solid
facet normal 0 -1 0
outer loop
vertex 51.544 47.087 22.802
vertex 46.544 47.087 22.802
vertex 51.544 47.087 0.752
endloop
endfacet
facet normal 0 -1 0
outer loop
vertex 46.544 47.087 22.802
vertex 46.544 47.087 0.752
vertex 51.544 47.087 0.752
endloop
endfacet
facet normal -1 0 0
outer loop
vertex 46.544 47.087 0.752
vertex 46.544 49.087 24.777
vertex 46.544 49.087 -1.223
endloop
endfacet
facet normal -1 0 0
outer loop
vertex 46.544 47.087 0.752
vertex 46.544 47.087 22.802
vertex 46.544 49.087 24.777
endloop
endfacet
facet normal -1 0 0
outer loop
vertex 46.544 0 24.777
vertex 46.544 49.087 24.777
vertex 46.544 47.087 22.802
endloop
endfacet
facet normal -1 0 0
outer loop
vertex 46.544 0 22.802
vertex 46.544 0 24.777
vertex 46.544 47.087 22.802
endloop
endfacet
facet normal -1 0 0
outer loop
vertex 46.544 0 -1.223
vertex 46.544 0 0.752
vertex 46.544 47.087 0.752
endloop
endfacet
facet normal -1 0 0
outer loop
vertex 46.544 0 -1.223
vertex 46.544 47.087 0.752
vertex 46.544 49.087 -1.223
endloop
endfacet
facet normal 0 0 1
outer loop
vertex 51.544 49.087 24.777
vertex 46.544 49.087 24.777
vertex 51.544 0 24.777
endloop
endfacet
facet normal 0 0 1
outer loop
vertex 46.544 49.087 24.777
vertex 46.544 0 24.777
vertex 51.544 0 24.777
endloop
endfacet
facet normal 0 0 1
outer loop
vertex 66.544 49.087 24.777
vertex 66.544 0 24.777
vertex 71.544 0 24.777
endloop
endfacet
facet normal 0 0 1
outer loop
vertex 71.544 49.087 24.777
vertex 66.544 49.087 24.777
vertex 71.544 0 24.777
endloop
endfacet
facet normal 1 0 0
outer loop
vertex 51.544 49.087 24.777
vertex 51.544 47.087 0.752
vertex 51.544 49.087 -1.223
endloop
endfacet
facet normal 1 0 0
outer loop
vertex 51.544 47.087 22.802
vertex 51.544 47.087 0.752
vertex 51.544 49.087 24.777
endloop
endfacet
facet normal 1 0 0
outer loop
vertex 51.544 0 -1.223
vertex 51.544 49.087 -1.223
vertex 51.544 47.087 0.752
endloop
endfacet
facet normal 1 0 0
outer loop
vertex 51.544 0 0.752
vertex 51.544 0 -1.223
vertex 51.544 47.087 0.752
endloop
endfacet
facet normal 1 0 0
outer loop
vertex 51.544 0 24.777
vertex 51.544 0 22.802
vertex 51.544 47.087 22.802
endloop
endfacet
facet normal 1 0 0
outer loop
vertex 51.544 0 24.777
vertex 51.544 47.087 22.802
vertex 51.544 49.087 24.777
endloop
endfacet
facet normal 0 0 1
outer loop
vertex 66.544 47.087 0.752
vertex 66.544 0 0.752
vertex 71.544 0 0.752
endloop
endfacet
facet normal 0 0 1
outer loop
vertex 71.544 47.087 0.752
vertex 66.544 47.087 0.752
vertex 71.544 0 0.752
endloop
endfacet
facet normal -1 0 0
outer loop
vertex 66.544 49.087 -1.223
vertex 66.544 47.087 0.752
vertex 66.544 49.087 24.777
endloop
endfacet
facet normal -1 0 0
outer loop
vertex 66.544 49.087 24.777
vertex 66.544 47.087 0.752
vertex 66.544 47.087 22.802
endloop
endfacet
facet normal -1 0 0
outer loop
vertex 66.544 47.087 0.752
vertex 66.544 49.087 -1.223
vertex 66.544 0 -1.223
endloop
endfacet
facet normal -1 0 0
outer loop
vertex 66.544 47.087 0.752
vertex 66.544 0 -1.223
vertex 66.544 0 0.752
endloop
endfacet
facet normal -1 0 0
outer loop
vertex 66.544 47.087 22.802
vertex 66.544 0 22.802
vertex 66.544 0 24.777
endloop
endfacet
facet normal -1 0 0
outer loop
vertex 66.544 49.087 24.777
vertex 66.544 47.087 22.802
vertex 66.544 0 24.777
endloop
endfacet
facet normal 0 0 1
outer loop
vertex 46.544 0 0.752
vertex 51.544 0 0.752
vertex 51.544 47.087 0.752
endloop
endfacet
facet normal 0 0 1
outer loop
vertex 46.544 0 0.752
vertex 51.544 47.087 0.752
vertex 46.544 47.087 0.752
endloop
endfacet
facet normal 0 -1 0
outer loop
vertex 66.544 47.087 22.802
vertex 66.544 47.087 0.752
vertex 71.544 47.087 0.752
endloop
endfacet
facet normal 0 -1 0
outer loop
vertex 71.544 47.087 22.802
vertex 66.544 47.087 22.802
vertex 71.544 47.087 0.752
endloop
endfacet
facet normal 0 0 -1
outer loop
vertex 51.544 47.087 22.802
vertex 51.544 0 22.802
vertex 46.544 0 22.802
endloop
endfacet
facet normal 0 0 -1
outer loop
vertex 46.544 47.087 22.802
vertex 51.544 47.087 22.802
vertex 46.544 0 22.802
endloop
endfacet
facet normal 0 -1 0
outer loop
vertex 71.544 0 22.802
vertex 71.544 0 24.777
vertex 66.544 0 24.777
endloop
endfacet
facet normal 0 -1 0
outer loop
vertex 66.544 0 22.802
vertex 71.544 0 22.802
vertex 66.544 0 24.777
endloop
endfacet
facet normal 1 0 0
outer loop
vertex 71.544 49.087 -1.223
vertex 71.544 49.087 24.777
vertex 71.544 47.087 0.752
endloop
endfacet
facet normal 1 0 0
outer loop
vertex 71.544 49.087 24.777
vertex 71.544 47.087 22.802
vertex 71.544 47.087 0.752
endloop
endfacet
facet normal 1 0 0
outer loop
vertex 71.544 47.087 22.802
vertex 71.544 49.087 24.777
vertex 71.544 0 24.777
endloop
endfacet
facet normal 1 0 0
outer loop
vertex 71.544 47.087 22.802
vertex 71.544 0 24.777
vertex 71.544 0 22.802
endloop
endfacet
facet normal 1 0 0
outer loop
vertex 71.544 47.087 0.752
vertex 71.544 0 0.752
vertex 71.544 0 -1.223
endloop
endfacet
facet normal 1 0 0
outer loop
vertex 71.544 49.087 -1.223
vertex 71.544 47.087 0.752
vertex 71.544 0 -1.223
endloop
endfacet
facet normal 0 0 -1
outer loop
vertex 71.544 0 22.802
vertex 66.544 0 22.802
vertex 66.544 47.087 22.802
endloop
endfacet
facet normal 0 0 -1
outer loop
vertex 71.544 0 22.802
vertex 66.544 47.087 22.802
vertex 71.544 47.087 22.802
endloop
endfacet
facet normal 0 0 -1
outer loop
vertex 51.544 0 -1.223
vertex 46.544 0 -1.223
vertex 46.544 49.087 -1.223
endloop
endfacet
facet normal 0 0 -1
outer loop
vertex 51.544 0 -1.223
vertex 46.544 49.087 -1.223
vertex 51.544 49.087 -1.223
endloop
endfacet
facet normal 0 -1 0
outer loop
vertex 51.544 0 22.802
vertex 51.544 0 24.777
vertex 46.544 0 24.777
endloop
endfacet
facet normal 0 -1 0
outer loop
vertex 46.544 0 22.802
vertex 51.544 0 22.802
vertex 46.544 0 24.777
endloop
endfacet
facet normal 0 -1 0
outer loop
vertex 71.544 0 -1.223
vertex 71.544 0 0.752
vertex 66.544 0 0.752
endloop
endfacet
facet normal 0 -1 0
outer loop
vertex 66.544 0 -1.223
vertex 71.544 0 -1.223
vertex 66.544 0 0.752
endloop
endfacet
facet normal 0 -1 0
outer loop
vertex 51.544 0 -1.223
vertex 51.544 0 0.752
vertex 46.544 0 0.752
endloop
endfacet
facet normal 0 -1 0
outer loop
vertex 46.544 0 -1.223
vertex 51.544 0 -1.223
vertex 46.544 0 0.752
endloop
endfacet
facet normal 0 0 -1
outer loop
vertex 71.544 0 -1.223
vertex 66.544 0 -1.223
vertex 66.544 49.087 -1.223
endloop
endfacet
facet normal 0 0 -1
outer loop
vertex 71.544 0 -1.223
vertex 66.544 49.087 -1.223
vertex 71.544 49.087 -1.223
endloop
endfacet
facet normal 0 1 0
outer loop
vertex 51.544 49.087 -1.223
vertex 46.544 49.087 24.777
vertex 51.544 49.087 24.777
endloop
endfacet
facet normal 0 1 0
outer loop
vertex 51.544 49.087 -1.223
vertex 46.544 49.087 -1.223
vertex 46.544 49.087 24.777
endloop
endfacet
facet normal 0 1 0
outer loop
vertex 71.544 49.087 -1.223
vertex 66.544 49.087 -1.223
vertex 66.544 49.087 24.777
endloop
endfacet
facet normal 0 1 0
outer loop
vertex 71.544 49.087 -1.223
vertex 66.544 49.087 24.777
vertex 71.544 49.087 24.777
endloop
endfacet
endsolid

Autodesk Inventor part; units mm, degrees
ref_plane "YZ Plane" through (0, 0, 0) normal (1, 0, 0) x (0, 1, 0)
ref_plane "XZ Plane" through (0, 0, 0) normal (0, 1, 0) x (-1, 0, 0)
ref_plane "XY Plane" through (0, 0, 0) normal (0, 0, 1) x (1, 0, 0)
sketch "Skizze1" plane through (0, 0, 0) normal (0, 1, 0) x (-1, 0, 0)
  line L0 (-26.5441, -1.2228) -> (-26.5441, 24.7772) projected
  line L1 (-28.5441, 26.7772) -> (-82.5441, 26.7772) projected
  line L2 (-84.5441, 24.7772) -> (-84.5441, 18.6937) projected
  line L3 (-82.5441, -3.2228) -> (-28.5441, -3.2228) projected
  line L4 (-32.5441, -1.2228) -> (-80.0242, -1.2228) projected
  line L5 (-82.5441, 0.5262) -> (-82.5441, 4.8607) projected
  line L6 (-80.0242, 24.7772) -> (-32.5441, 24.7772) projected
  line L7 (-28.5441, 21.7772) -> (-28.5441, 1.7772) projected
  line L8 (-71.5441, 12.2772) -> (-71.5441, 11.2772) projected
  line L9 (-66.5441, 0.7522) -> (-71.5441, 0.7522)
  line L10 (-71.5441, 0.7522) -> (-71.5441, -1.2228)
  line L11 (-71.5441, -1.2228) -> (-66.5441, -1.2228)
  line L12 (-66.5441, -1.2228) -> (-66.5441, 0.7522)
  line L13 (-66.5441, 22.8022) -> (-71.5441, 22.8022)
  line L14 (-71.5441, 22.8022) -> (-71.5441, 24.7772)
  line L15 (-71.5441, 24.7772) -> (-66.5441, 24.7772)
  line L16 (-66.5441, 24.7772) -> (-66.5441, 22.8022)
  line L17 (-51.5441, 0.7522) -> (-46.5441, 0.7522)
  line L18 (-46.5441, 0.7522) -> (-46.5441, -1.2228)
  line L19 (-46.5441, -1.2228) -> (-51.5441, -1.2228)
  line L20 (-51.5441, -1.2228) -> (-51.5441, 0.7522)
  line L21 (-51.5441, 22.8022) -> (-46.5441, 22.8022)
  line L22 (-46.5441, 22.8022) -> (-46.5441, 24.7772)
  line L23 (-46.5441, 24.7772) -> (-51.5441, 24.7772)
  line L24 (-51.5441, 24.7772) -> (-51.5441, 22.8022)
  line L25 (-28.5441, 21.7022) -> (-28.5441, 24.7772) projected
  line L26 (-28.5441, 21.7022) -> (-28.5441, 24.7772) projected
  line L27 (-30.2441, 24.7772) -> (-30.2441, 21.7022) projected
  line L28 (-30.2441, 24.7772) -> (-30.2441, 21.7022) projected
  line L29 (-28.5441, 24.7772) -> (-30.2441, 24.7772) projected
  line L30 (-28.5441, 24.7772) -> (-30.2441, 24.7772) projected
  line L31 (-82.5441, 4.8607) -> (-84.5441, 4.8607) projected
  line L32 (-84.5441, 4.8607) -> (-84.5441, -1.2228) projected
  line L33 (-84.5441, 18.6937) -> (-82.5441, 18.6937) projected
  line L34 (-82.5441, 18.6937) -> (-82.5441, 23.0282) projected
  arc A0 (-82.5441, 26.7772) -> (-84.5441, 24.7772) centre (-82.5441, 24.7772) ccw projected
  line L35 (-32.5441, 21.7772) -> (-32.5441, 24.7772) projected
  line L36 (-28.5441, 21.7772) -> (-32.5441, 21.7772) projected
  line L37 (-28.5441, 1.7772) -> (-32.5441, 1.7772) projected
  line L38 (-32.5441, -1.2228) -> (-32.5441, 1.7772) projected
  arc A1 (-84.5441, -1.2228) -> (-82.5441, -3.2228) centre (-82.5441, -1.2228) ccw projected
  arc A2 (-28.5441, -3.2228) -> (-26.5441, -1.2228) centre (-28.5441, -1.2228) ccw projected
  arc A3 (-26.5441, 24.7772) -> (-28.5441, 26.7772) centre (-28.5441, 24.7772) ccw projected
  circle A4 centre (-29.5441, -0.7228) radius 1.6 projected
  circle A5 centre (-29.5441, 24.2772) radius 1.6 projected
  line L39 (-30.2441, 21.7022) -> (-28.5441, 21.7022) projected
  line L40 (-30.2441, 21.7022) -> (-28.5441, 21.7022) projected
  arc A6 (-82.5441, 0.5262) -> (-80.0242, -1.2228) centre (-81.5441, -0.7228) ccw projected
  arc A7 (-80.0242, 24.7772) -> (-82.5441, 23.0282) centre (-81.5441, 24.2772) ccw projected
  point P0 (0, 0)
  point P1 (-82.5441, 23.9022)
  point P2 (-16.5441, 23.9022)
  point P3 (-82.5441, -0.3478)
  point P4 (-16.5441, -0.3478)
  point P5 (-46.5441, -1.2228)
  point P6 (-34.1441, -1.2228)
  point P7 (-34.1441, 24.7772)
  point P8 (-82.5441, 21.7022)
  point P9 (-82.5441, 14.9472)
  point P10 (-84.5441, 14.9472)
  point P11 (-84.5441, 8.6072)
  point P12 (-82.5441, 8.6072)
  point P13 (-82.5441, 1.8522)
  point P14 (-62.2341, 17.4772)
  point P15 (-62.2341, 6.0772)
  point P16 (-62.2341, 17.4772)
  point P17 (-62.2341, 6.0772)
  point P18 (-60.2341, 17.4772)
  point P19 (-60.4341, 18.349)
  point P20 (-60.4341, 5.2054)
  point P21 (-60.2341, 6.0772)
  point P22 (-28.4341, -1.2228)
  point P23 (-28.4341, 24.7772)
  point P24 (-60.4341, 20.5272)
  point P25 (-60.4341, 3.0272)
  point P26 (-29.4341, 3.0272)
  point P27 (-29.4341, 8.0272)
  point P28 (-62.2341, 17.4772)
  point P29 (-62.2341, 6.0772)
  point P30 (-62.2341, 17.4772)
  point P31 (-62.2341, 6.0772)
  point P32 (-62.2341, 17.4772)
  point P33 (-62.2341, 6.0772)
  point P34 (-62.2341, 17.4772)
  point P35 (-62.2341, 6.0772)
  point P36 (-62.2341, 17.4772)
  point P37 (-62.2341, 6.0772)
  point P38 (-30.2441, 20.5272)
  point P39 (-62.2341, 17.4772)
  point P40 (-62.2341, 6.0772)
  point P41 (-62.2341, 17.4772)
  point P42 (-62.2341, 6.0772)
  point P43 (-62.2341, 17.4772)
  point P44 (-62.2341, 6.0772)
  point P45 (-62.2341, 17.4772)
  point P46 (-62.2341, 6.0772)
  point P47 (-62.2341, 17.4772)
  point P48 (-62.2341, 6.0772)
extrude "Extrusion1" add sketch "Skizze1" along normal blind 47.0872 contours L10 L9 L12 L4 | L6 L16 L13 L14 | L20 L17 L18 L4 | L6 L22 L21 L24
sketch "Skizze2" plane through (0, 47.0872, 0) normal (0, 1, 0) x (1, 0, 0)
  line L0 (71.5441, 1.2228) -> (66.5441, 1.2228) projected
  line L1 (71.5441, -0.7522) -> (71.5441, 1.2228) projected
  line L2 (66.5441, -24.7772) -> (71.5441, -24.7772)
  line L3 (71.5441, -24.7772) -> (71.5441, 1.2228)
  line L4 (71.5441, 1.2228) -> (66.5441, 1.2228)
  line L5 (66.5441, 1.2228) -> (66.5441, -24.7772)
  line L6 (51.5441, 1.2228) -> (46.5441, 1.2228) projected
  line L7 (51.5441, 1.2228) -> (46.5441, 1.2228)
  line L8 (46.5441, 1.2228) -> (46.5441, -24.7772)
  line L9 (46.5441, -24.7772) -> (51.5441, -24.7772)
  line L10 (51.5441, -24.7772) -> (51.5441, 1.2228)
  line L11 (46.5441, -0.7522) -> (51.5441, -0.7522) projected
  line L12 (51.5441, -0.7522) -> (51.5441, 1.2228) projected
  line L13 (51.5441, 1.2228) -> (46.5441, 1.2228) projected
  line L14 (46.5441, 1.2228) -> (46.5441, -0.7522) projected
  line L15 (71.5441, 1.2228) -> (66.5441, 1.2228) projected
  line L16 (66.5441, 1.2228) -> (66.5441, -0.7522) projected
  line L17 (66.5441, -0.7522) -> (71.5441, -0.7522) projected
  line L18 (71.5441, -0.7522) -> (71.5441, 1.2228) projected
  line L19 (46.5441, -24.7772) -> (51.5441, -24.7772) projected
  line L20 (51.5441, -24.7772) -> (51.5441, -22.8022) projected
  line L21 (51.5441, -22.8022) -> (46.5441, -22.8022) projected
  line L22 (46.5441, -22.8022) -> (46.5441, -24.7772) projected
  line L23 (71.5441, -22.8022) -> (66.5441, -22.8022) projected
  line L24 (66.5441, -22.8022) -> (66.5441, -24.7772) projected
  line L25 (66.5441, -24.7772) -> (71.5441, -24.7772) projected
  line L26 (71.5441, -24.7772) -> (71.5441, -22.8022) projected
  point P0 (0, 0)
extrude "Extrusion2" add sketch "Skizze2" along normal blind 2
properties part number "Bridge"
